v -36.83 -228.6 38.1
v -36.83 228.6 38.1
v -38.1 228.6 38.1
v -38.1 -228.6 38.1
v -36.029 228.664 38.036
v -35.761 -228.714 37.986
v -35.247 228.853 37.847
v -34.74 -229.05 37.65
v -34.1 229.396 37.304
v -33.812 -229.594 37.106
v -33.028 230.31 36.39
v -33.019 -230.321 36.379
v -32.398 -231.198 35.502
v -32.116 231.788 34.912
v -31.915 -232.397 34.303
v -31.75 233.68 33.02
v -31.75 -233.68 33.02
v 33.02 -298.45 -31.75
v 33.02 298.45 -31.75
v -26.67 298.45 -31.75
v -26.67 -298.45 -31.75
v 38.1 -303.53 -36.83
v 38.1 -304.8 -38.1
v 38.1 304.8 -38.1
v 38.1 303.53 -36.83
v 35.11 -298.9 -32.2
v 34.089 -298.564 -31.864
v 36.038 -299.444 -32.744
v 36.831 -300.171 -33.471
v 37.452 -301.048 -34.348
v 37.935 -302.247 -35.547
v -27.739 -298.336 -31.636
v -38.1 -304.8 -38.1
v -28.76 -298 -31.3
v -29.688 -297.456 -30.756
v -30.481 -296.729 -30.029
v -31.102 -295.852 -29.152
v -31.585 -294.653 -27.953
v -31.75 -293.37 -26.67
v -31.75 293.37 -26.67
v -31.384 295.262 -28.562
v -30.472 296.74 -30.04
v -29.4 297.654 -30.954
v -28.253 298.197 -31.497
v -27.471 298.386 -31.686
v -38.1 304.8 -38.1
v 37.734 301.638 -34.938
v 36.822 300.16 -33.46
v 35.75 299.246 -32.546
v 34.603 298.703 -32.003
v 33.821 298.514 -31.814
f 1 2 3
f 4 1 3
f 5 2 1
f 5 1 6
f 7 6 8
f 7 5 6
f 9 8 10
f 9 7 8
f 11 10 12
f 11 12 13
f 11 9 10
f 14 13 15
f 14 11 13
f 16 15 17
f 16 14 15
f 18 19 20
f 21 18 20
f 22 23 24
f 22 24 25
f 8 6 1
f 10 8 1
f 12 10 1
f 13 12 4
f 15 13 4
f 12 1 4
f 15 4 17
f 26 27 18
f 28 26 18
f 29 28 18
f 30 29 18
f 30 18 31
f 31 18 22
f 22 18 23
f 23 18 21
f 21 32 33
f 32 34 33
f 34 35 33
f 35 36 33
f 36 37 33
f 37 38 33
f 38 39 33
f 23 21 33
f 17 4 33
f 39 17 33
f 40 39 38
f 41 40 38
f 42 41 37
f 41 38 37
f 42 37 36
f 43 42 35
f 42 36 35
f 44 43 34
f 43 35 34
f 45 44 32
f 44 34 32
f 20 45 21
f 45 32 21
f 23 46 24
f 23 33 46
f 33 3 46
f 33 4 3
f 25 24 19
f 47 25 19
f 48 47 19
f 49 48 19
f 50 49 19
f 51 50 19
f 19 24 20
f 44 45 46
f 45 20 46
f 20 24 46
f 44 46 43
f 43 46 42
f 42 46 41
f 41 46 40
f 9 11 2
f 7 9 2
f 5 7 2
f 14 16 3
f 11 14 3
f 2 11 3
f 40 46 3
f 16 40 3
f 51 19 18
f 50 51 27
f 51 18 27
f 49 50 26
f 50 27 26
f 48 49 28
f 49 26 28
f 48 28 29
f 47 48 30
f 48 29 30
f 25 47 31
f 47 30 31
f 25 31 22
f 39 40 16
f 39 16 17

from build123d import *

# Parameters (mm, degrees)
F1_DEPTH = 304.8
F2_R     = 5.08
F4_DEPTH = 76.2


with BuildPart() as f1:
    # F0 (on Front) → F1 (new body, symmetric)
    with BuildSketch(Plane.XZ):
        Polygon((-38.1, -38.1), (38.1, -38.1), (38.1, -31.75), (-31.75, -31.75), (-31.75, 38.1), (-38.1, 38.1), align=None)
    extrude(amount=F1_DEPTH, both=True)

    # F2
    f2_edges = [f1.edges().sort_by_distance(p)[0] for p in [
        (-31.75, 0, 38.1),
        (-31.75, 0, -31.75),
        (38.1, 0, -31.75),
    ]]
    fillet(f2_edges, radius=F2_R)

    # F3 (on face) → F4 (cut)
    with BuildSketch(Plane(origin=(-38.1, 0, 0), x_dir=(0, -1, 0), z_dir=(-1, 0, 0))):
        Polygon((-304.8, 38.1), (-304.8, -38.1), (-228.6, 38.1), align=None)
        Polygon((228.6, 38.1), (304.8, -38.1), (304.8, 38.1), align=None)
    extrude(amount=-F4_DEPTH, mode=Mode.SUBTRACT)


solid = f1.part
